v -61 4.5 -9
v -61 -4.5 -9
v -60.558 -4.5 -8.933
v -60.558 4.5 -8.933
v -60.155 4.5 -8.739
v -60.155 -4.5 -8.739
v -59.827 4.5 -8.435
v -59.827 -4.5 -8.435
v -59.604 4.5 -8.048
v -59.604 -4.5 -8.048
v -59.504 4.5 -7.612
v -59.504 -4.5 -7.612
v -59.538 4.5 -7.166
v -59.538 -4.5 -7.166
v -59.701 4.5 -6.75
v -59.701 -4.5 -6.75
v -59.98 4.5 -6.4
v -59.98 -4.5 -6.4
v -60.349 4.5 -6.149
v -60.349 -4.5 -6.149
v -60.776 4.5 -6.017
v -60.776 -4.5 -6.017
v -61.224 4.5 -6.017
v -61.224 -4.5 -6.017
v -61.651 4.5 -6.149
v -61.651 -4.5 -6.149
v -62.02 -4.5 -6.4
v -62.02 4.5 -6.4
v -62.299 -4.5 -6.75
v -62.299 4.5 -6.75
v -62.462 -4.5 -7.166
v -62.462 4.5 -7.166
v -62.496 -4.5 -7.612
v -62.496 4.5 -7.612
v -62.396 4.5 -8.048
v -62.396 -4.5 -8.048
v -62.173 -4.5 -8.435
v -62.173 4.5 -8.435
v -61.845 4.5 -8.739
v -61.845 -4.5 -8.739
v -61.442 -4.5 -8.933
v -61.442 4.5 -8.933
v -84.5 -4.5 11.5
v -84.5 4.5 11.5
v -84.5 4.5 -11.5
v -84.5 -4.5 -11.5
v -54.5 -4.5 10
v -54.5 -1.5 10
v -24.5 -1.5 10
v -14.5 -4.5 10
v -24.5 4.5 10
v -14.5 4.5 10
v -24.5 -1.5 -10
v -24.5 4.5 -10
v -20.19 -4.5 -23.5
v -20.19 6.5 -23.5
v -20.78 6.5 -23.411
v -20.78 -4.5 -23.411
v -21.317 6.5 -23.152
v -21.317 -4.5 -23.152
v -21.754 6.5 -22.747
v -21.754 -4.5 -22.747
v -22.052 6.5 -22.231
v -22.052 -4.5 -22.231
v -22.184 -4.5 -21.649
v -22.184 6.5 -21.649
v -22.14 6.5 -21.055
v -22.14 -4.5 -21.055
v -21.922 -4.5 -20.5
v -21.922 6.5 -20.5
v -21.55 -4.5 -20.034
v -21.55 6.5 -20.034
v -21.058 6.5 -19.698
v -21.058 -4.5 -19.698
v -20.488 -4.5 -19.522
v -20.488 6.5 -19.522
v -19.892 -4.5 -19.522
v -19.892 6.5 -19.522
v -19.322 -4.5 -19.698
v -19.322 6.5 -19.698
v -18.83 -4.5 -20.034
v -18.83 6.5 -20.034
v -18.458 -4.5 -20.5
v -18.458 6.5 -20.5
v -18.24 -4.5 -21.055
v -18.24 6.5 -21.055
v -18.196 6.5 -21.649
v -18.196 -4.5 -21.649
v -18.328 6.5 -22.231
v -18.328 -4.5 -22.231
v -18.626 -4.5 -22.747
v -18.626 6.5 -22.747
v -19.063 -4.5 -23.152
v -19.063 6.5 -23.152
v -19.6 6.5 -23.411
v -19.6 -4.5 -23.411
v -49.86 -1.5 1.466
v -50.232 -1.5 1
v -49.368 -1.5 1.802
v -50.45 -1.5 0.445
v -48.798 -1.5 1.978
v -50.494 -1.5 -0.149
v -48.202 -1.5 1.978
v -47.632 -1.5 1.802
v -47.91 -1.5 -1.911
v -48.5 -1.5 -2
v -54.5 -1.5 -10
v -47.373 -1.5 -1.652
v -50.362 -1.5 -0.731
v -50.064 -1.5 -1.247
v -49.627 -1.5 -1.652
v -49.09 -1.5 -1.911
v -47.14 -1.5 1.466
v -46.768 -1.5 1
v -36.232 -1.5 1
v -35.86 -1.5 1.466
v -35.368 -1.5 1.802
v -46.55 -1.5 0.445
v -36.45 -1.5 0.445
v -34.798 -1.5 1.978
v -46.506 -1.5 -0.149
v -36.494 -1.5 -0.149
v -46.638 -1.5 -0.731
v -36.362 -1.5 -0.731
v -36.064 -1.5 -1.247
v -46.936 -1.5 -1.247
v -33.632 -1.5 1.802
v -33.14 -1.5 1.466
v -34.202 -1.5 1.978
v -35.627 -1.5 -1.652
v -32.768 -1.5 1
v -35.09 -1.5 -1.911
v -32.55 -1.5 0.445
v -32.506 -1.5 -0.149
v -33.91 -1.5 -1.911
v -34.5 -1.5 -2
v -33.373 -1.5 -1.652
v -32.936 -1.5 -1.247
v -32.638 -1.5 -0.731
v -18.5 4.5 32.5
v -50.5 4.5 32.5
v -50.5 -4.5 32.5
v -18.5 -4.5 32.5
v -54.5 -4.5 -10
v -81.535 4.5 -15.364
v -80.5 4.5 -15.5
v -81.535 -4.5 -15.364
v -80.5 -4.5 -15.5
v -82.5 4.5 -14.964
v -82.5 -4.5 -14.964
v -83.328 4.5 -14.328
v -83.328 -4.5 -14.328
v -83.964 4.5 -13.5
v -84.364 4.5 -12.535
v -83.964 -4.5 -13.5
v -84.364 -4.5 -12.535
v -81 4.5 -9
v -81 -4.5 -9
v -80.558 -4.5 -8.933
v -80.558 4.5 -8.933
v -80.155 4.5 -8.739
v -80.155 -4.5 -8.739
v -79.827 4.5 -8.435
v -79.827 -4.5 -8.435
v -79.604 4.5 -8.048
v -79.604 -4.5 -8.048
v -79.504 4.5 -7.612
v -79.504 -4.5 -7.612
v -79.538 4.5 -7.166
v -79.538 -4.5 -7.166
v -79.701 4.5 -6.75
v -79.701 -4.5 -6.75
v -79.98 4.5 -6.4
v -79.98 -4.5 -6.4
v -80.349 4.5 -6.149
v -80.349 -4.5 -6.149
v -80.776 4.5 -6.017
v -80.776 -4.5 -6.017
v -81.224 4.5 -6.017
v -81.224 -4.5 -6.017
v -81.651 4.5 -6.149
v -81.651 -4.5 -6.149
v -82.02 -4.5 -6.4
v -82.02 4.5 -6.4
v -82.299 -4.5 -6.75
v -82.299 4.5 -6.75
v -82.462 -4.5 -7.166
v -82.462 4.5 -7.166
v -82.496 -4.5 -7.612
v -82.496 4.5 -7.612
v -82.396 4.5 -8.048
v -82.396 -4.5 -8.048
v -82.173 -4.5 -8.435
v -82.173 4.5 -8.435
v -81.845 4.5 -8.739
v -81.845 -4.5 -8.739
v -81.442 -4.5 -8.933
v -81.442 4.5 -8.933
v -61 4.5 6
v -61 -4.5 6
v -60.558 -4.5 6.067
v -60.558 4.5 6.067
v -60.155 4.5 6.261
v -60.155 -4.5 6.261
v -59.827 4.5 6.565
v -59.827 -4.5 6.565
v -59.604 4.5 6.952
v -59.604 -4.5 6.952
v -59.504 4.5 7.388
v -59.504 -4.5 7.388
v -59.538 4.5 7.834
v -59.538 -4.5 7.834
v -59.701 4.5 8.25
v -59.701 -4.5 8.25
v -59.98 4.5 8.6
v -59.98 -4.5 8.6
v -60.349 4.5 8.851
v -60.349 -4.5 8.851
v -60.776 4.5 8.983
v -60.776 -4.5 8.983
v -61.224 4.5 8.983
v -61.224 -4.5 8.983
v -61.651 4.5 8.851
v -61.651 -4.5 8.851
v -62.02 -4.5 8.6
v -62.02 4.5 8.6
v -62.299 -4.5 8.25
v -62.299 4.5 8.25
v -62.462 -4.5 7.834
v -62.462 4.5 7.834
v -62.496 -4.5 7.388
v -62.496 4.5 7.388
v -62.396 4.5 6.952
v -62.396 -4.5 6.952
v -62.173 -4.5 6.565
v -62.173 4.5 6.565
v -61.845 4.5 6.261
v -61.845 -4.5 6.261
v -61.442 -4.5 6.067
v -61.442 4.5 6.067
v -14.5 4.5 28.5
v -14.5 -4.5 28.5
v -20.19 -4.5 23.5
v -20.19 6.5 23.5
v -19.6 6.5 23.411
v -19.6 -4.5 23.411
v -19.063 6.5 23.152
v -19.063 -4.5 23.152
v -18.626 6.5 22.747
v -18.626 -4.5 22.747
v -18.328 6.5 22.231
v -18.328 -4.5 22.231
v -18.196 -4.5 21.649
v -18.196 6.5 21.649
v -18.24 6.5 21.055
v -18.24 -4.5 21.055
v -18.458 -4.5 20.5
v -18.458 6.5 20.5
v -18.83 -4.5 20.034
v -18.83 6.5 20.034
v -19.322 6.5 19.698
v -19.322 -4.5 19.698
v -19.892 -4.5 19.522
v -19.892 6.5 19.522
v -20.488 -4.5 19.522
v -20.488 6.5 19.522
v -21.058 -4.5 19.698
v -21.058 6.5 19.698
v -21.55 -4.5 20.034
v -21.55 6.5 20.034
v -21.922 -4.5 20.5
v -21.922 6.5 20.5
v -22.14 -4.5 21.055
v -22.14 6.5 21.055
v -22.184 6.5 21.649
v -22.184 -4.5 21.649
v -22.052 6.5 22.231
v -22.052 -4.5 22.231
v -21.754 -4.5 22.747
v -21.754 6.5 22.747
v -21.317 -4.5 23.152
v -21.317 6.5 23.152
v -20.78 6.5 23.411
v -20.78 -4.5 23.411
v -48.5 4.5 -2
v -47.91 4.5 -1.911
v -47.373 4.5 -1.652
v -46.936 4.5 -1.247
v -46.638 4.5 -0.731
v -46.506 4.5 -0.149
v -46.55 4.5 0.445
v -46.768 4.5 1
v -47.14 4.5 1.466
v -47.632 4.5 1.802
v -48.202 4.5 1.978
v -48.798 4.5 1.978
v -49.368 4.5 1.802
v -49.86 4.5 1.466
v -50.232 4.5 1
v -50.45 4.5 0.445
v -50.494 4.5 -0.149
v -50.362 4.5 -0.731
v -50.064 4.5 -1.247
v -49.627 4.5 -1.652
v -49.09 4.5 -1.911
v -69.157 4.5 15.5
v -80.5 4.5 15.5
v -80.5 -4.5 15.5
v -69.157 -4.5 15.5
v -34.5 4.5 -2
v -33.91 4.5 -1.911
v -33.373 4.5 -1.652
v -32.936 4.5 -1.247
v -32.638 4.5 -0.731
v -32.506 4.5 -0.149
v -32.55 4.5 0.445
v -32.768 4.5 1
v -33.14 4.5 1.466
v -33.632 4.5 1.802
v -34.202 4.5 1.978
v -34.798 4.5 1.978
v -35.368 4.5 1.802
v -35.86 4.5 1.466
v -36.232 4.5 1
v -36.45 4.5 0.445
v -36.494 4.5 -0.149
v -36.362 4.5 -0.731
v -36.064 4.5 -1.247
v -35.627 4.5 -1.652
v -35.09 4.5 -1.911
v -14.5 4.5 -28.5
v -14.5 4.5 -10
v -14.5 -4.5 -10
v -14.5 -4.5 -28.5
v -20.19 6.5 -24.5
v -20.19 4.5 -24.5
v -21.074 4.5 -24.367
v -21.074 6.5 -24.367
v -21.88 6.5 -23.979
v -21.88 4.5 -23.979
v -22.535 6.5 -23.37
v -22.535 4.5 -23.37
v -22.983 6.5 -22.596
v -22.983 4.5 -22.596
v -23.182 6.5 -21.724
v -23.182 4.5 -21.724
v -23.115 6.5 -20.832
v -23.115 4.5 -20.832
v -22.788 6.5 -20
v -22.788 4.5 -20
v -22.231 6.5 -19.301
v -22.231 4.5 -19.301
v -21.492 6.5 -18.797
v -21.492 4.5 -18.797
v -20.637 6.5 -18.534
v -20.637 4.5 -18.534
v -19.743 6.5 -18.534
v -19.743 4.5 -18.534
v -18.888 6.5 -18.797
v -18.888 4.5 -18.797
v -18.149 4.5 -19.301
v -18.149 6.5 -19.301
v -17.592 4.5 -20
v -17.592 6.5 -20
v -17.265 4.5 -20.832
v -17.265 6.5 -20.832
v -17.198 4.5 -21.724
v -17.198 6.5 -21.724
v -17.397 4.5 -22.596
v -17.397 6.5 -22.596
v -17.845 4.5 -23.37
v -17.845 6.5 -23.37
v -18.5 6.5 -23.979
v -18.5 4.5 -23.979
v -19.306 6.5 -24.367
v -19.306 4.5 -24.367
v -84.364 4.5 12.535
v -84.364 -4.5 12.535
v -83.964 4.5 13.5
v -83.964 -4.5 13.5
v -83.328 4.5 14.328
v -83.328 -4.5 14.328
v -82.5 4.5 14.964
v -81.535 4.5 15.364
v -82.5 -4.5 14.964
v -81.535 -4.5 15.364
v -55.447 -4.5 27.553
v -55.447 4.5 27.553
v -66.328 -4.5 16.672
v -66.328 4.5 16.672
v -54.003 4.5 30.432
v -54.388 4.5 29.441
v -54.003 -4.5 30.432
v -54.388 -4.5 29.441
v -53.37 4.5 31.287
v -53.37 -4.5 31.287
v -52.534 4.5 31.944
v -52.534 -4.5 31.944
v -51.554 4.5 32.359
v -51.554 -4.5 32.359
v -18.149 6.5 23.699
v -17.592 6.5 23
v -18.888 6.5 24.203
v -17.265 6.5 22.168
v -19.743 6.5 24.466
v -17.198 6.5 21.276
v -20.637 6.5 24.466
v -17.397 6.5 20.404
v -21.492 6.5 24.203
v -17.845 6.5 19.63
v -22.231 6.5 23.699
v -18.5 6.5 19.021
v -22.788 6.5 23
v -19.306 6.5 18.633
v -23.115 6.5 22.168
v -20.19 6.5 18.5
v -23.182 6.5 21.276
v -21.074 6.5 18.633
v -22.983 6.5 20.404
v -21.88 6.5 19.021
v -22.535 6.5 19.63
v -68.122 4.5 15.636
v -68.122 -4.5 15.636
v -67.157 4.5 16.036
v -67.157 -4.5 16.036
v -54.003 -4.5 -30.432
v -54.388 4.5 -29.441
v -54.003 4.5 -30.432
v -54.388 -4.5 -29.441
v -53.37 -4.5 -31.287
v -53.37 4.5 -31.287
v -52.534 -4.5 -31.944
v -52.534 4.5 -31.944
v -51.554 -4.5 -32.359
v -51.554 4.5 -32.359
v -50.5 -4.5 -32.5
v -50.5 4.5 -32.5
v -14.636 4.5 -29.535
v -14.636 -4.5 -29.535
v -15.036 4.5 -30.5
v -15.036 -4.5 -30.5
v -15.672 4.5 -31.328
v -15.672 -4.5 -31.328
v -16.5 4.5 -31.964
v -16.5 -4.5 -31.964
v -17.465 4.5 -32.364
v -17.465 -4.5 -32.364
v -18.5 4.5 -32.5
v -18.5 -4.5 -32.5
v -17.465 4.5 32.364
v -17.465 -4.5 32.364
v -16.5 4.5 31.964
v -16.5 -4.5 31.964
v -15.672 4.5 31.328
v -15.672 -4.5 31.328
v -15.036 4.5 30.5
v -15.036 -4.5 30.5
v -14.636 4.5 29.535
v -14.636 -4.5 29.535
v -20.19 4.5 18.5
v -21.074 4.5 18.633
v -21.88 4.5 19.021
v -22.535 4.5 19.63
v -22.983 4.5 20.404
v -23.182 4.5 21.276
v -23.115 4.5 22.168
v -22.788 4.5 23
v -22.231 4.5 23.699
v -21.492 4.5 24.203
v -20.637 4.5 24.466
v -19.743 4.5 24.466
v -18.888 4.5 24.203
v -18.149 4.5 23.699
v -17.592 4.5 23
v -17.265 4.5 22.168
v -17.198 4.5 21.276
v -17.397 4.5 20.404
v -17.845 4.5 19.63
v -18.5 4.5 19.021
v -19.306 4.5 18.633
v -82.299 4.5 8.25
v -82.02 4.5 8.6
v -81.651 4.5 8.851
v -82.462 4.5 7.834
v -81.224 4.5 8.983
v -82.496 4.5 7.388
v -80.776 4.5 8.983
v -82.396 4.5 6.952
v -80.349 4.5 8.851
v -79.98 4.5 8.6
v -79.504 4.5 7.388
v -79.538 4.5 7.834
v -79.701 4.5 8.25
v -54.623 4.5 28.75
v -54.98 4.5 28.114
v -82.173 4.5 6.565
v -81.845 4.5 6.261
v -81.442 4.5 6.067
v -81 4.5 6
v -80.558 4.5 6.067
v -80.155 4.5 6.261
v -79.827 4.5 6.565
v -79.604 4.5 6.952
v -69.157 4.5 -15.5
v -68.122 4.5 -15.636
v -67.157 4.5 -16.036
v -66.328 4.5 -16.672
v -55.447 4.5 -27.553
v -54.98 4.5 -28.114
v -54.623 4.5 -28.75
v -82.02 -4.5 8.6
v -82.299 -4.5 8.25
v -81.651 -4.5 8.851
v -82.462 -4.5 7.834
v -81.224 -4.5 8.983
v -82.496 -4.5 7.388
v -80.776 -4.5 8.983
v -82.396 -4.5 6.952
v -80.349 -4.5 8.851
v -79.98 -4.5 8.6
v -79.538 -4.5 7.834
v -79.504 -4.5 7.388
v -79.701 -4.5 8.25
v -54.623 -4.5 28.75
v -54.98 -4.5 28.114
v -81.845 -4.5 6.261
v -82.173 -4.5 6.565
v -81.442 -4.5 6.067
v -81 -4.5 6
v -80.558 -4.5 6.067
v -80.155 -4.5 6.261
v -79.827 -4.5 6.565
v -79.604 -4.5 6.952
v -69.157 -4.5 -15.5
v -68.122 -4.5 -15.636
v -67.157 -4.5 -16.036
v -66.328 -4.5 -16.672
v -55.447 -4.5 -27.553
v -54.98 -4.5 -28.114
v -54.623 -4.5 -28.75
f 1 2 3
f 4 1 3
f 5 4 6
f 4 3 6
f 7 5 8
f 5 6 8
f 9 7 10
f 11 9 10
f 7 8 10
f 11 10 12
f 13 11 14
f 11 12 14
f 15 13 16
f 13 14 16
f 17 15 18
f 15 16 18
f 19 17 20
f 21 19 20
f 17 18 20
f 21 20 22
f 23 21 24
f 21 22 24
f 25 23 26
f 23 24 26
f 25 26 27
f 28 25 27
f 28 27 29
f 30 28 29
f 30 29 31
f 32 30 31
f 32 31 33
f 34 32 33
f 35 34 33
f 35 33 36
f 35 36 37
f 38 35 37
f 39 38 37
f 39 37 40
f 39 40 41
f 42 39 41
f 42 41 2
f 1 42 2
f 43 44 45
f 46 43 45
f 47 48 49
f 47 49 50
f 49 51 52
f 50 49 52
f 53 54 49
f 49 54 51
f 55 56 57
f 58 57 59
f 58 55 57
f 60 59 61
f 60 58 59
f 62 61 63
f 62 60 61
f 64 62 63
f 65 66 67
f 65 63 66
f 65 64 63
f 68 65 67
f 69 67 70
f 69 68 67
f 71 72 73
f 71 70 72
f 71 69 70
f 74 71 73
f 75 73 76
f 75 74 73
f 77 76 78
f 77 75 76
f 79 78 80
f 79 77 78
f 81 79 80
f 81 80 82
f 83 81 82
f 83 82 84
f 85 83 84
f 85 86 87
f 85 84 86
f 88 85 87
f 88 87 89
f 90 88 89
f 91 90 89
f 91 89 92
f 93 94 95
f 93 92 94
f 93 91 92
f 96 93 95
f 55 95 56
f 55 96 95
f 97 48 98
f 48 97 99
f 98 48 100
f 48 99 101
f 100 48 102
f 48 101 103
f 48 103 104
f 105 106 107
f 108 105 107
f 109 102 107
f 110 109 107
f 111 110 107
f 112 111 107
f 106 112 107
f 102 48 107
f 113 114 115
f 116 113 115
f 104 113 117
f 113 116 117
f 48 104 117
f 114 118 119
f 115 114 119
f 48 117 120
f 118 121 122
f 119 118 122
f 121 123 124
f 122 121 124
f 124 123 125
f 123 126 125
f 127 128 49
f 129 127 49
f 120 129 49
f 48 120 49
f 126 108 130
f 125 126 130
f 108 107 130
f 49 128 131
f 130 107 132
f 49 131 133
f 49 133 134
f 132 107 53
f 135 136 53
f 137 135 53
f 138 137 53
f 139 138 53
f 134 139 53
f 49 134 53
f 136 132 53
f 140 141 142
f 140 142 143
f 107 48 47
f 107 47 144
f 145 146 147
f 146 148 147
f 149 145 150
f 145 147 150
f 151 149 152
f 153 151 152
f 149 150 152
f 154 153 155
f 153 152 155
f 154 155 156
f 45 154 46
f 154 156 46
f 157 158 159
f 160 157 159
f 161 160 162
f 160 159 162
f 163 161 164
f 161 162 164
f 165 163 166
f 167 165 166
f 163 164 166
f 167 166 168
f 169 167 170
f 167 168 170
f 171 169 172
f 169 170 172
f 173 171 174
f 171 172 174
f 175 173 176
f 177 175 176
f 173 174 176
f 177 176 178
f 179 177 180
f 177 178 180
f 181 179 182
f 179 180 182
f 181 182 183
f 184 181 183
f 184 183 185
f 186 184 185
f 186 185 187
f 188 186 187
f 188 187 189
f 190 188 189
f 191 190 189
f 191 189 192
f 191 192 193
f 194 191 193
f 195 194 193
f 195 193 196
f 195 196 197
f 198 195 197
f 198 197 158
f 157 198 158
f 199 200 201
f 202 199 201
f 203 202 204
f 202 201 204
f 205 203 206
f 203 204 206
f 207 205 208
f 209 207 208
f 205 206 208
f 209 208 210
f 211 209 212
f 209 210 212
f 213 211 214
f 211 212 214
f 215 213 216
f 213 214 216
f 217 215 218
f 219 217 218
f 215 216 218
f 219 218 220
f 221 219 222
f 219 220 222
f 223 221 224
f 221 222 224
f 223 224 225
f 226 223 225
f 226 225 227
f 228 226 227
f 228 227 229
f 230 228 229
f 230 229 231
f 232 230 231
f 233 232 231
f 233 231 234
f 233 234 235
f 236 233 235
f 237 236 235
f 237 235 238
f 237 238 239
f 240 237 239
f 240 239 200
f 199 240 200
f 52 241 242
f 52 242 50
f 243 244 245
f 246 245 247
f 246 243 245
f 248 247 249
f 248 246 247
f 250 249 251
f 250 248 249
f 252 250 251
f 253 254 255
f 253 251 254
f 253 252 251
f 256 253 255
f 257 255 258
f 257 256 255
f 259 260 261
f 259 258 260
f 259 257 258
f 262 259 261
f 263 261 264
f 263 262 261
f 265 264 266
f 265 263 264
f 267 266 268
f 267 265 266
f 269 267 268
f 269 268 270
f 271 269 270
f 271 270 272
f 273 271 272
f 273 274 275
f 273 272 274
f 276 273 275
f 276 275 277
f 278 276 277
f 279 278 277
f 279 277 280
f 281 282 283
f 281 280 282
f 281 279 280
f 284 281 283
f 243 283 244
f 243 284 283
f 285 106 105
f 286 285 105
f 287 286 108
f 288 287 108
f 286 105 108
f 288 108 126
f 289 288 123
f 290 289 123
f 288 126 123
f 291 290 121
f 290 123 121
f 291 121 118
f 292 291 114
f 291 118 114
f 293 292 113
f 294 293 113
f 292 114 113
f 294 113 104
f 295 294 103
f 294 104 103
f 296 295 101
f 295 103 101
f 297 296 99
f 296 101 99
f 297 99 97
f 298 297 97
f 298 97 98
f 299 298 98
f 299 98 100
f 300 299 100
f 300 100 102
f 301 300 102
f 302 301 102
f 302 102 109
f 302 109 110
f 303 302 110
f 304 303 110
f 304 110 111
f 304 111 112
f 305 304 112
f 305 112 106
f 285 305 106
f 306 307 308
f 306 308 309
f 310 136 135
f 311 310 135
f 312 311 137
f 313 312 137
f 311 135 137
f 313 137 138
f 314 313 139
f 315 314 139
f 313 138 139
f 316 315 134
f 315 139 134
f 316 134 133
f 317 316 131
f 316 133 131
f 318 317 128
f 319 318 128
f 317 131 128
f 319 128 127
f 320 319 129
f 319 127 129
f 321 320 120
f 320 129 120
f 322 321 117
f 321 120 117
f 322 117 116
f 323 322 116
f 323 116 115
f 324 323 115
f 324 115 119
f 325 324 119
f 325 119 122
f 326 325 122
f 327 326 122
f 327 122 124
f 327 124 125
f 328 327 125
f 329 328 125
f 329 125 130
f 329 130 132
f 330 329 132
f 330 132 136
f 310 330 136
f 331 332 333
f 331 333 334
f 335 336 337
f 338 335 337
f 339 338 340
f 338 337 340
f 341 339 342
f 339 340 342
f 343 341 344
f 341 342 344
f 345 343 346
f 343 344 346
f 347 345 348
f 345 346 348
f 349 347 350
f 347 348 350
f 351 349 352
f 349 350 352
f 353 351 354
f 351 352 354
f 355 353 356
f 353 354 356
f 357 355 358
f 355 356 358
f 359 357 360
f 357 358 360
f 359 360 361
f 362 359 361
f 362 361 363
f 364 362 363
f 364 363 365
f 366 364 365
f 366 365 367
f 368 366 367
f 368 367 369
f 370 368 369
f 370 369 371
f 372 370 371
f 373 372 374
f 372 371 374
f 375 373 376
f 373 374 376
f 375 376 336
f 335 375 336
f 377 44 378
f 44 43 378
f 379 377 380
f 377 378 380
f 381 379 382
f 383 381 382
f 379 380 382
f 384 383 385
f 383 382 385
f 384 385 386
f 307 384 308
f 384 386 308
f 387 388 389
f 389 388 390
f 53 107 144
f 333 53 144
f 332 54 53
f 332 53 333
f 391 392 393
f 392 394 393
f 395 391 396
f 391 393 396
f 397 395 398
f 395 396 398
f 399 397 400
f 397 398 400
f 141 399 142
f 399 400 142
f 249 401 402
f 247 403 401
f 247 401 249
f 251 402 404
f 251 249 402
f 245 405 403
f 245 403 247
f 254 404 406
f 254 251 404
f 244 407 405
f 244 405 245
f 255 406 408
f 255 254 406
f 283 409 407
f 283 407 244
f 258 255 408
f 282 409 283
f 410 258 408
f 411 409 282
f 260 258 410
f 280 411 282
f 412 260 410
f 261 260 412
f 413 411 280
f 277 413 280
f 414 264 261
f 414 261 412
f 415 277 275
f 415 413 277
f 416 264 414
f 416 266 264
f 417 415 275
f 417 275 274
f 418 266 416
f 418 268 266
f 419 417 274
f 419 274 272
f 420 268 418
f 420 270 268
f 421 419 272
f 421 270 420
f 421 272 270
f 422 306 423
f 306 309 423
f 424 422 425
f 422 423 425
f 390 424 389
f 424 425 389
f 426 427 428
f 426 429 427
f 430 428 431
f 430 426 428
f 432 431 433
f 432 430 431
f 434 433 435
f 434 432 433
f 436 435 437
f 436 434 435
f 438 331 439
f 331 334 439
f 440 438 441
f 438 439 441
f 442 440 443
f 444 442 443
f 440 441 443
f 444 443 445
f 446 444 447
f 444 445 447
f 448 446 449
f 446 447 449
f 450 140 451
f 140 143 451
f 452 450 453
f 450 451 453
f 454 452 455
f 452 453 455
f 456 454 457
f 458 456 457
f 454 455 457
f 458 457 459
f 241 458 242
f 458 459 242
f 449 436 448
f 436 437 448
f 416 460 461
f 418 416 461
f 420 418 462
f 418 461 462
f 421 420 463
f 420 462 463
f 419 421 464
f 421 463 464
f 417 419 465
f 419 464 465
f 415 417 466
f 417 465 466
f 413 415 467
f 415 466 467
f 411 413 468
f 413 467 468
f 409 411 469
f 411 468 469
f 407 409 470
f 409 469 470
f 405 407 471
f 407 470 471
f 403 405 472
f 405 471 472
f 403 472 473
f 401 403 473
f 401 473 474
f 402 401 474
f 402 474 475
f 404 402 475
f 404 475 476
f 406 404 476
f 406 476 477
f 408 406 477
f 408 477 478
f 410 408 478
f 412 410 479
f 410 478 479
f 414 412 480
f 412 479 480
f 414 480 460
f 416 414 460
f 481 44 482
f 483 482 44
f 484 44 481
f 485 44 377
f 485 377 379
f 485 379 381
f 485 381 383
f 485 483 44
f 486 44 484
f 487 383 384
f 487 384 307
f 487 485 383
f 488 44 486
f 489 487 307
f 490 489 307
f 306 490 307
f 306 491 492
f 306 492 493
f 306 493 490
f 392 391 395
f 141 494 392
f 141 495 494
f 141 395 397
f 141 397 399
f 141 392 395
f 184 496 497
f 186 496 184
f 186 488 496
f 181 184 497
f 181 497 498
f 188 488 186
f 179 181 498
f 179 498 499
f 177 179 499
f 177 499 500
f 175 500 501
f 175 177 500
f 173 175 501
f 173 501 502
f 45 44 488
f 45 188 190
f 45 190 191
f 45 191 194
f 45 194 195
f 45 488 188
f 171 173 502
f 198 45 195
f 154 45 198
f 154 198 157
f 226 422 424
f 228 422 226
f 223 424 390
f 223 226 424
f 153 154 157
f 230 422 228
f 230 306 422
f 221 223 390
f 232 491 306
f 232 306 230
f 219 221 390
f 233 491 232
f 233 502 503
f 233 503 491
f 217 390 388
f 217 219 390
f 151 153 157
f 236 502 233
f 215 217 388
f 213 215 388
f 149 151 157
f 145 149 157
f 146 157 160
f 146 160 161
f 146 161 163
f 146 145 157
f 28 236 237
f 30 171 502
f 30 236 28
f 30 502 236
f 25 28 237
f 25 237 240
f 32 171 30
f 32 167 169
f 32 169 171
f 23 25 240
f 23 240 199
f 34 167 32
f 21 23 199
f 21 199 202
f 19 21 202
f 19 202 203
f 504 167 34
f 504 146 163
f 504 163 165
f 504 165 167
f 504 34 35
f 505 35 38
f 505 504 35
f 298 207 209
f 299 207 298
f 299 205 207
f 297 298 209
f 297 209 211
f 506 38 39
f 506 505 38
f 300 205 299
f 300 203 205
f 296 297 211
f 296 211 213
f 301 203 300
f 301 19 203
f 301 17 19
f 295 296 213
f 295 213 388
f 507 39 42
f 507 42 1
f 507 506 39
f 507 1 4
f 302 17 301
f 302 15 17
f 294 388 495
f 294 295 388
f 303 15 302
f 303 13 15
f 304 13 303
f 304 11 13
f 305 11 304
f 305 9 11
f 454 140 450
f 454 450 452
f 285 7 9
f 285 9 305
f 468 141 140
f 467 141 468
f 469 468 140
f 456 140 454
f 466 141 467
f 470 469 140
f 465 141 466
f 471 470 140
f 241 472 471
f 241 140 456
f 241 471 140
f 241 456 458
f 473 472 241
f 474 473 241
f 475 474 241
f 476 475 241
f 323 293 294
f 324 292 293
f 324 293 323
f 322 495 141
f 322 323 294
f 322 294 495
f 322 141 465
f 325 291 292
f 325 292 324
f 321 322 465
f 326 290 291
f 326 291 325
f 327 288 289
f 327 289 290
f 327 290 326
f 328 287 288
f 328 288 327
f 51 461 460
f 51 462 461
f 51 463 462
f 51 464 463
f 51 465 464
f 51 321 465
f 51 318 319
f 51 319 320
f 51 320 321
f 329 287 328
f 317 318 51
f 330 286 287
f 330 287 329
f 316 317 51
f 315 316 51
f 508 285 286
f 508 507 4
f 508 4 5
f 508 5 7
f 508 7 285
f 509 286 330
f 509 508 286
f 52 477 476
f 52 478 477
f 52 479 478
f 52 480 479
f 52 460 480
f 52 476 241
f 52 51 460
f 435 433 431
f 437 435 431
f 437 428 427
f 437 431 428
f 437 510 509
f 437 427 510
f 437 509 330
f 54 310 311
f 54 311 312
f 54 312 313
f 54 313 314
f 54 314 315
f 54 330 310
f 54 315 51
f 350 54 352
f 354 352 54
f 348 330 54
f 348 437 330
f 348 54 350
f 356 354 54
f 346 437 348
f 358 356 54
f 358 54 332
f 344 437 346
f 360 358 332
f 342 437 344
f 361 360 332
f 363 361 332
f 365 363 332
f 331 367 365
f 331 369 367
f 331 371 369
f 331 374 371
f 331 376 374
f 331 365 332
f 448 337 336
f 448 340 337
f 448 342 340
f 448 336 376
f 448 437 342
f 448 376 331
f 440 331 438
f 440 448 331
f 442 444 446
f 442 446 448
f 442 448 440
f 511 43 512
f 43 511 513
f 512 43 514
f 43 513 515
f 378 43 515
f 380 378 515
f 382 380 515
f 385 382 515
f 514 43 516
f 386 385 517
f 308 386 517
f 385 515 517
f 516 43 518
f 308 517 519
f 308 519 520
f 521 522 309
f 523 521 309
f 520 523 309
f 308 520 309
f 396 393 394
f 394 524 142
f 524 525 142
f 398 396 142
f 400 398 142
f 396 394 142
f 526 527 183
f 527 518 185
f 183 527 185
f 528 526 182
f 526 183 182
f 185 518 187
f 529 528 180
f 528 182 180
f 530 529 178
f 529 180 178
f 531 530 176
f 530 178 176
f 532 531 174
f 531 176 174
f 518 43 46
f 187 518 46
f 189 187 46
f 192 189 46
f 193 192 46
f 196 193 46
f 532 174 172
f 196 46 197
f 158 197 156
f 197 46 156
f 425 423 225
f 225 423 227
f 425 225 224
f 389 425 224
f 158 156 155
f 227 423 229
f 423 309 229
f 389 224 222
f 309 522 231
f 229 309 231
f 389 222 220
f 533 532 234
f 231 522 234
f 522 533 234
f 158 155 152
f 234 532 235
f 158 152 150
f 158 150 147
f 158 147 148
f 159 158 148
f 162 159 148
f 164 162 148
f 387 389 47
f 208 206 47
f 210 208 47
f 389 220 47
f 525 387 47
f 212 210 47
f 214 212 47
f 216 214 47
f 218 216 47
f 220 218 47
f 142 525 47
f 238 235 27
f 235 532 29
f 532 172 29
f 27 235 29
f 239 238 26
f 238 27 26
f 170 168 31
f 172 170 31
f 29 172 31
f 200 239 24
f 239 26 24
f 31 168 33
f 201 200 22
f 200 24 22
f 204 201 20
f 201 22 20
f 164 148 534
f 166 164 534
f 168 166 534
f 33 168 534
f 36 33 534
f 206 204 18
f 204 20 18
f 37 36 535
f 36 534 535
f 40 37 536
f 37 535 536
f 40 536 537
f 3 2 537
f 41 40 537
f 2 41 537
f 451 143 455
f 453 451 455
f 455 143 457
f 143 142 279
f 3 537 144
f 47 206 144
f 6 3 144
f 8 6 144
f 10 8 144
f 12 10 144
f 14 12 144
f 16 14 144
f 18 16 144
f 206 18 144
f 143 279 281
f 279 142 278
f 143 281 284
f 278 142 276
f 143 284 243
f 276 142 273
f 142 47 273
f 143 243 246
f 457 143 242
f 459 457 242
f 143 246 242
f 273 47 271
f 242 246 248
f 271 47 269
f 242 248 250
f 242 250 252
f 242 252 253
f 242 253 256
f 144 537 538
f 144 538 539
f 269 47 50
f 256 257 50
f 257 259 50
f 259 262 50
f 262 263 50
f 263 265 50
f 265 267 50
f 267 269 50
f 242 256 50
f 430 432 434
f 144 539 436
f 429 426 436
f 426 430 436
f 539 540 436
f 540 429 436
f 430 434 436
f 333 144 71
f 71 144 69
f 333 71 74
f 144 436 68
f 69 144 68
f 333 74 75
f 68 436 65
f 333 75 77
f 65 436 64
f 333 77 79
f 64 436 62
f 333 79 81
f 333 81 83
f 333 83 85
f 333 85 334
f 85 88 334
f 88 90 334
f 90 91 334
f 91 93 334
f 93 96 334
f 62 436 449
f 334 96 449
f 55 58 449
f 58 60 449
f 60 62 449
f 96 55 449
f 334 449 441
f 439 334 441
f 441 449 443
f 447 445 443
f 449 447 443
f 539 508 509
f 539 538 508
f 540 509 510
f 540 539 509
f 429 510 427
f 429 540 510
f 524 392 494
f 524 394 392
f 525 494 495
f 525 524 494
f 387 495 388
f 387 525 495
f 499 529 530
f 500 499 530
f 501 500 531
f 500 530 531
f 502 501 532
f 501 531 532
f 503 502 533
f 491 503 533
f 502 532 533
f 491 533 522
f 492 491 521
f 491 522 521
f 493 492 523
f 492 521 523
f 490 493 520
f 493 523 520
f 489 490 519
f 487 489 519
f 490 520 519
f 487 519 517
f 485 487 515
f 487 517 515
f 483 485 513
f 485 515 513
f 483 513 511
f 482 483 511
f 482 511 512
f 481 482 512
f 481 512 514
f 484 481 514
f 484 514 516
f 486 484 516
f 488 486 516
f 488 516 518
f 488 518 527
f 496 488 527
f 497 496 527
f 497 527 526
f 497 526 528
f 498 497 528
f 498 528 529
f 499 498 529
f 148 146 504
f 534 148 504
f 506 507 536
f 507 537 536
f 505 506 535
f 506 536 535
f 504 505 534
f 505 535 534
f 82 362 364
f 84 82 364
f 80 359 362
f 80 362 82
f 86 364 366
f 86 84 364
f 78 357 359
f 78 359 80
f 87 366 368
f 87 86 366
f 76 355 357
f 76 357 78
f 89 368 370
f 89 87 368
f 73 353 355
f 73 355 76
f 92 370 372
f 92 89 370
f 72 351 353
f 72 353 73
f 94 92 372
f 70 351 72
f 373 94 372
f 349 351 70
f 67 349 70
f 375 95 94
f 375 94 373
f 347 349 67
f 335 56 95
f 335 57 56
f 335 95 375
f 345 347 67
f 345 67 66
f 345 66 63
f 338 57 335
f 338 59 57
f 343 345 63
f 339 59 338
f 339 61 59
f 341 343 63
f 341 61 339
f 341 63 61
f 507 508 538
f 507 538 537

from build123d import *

# Parameters (mm, degrees)
SKETCH1_R               = 12
BOSS_EXTRUDE1_DEPTH     = 4.5
SKETCH2_R               = 1.7
CUT_EXTRUDE1_DEPTH      = 91.980767198
FILLET1_R               = 4
CUT_EXTRUDE4_DEPTH      = 91.980767198
SKETCH6_R               = 1.5
CUT_EXTRUDE5_DEPTH      = 41
CUT_EXTRUDE6_START      = -6
SKETCH7_W               = 30
SKETCH7_H               = 20
CUT_EXTRUDE6_DEPTH      = 3
SKETCH8_W               = 30
SKETCH8_H               = 17
CUT_EXTRUDE7_DEPTH      = 9
FILLET5_R               = 4
SKETCH10_W              = 10
SKETCH10_H              = 22.5
BOSS_EXTRUDE2_DEPTH     = 9
SKETCH13_R              = 3
BOSS_EXTRUDE4_DEPTH     = 2
CUT_EXTRUDE8_DEPTH      = 5
CUT_EXTRUDE8_DEPTH_BACK = 9
SKETCH11_R              = 2
FILLET6_R               = 4
BOSS_EXTRUDE3_DEPTH     = 9
FILLET8_R               = 4
SKETCH14_R              = 2
CUT_EXTRUDE9_DEPTH      = 16


with BuildPart() as part:
    # Sketch1 → Boss-Extrude1 (new, symmetric)
    with BuildSketch(Plane(origin=(0, 0, 0), x_dir=(1, 0, 0), z_dir=(0, 1, 0))):
        Polygon((21.5, 20), (21.5, -20), (-20.5, -32.5), (-84.5, -32.5), (-84.5, 32.5), (-20.5, 32.5), align=None)
        with Locations(Location((0, 0, 0), (0, 0, 270))):
            Circle(SKETCH1_R, mode=Mode.SUBTRACT)
    extrude(amount=BOSS_EXTRUDE1_DEPTH, both=True)

    # Sketch2 → Cut-Extrude1 (cut, through all)
    with BuildSketch(Plane(origin=(0, 4.5, 0), x_dir=(1, 0, 0), z_dir=(0, 1, 0))):
        with Locations(Location((15.5, 15.5, 0), (0, 0, 270))):
            Circle(SKETCH2_R)
        with Locations(Location((-15.5, 15.5, 0), (0, 0, 270))):
            Circle(SKETCH2_R)
        with Locations(Location((-15.5, -15.5, 0), (0, 0, 270))):
            Circle(SKETCH2_R)
        with Locations(Location((15.5, -15.5, 0), (0, 0, 270))):
            Circle(SKETCH2_R)
        with Locations(Location((-19.5, 27.5, 0), (0, 0, 270))):
            Circle(SKETCH2_R)
        with Locations(Location((-19.5, -27.5, 0), (0, 0, 270))):
            Circle(SKETCH2_R)
    extrude(amount=-CUT_EXTRUDE1_DEPTH, mode=Mode.SUBTRACT)

    # Fillet1
    fillet1_edges = [part.edges().sort_by_distance(p)[0] for p in [
        (-20.5, 0, 32.5),
        (-84.5, 0, 32.5),
        (-84.5, 0, -32.5),
        (-20.5, 0, -32.5),
        (21.5, 0, -20),
        (21.5, 0, 20),
    ]]
    fillet(fillet1_edges, radius=FILLET1_R)

    # Sketch5 → Cut-Extrude4 (cut, through all)
    with BuildSketch(Plane(origin=(0, 4.5, 0), x_dir=(1, 0, 0), z_dir=(0, 1, 0))):
        Polygon((-24.5, 32.5), (-24.5, 10), (-24.5, -10), (-24.5, -32.5), (26.912022907, -32.5), (26.912022907, 32.5), align=None)
    extrude(amount=-CUT_EXTRUDE4_DEPTH, mode=Mode.SUBTRACT)

    # Sketch6 → Cut-Extrude5 (cut)
    with BuildSketch(Plane.XZ.offset(4.5)):
        with Locations(Location((-81, -7.5, 0), (0, 0, 270))):
            Circle(SKETCH6_R)
        with Locations(Location((-81, 7.5, 0), (0, 0, 270))):
            Circle(SKETCH6_R)
        with Locations(Location((-61, -7.5, 0), (0, 0, 270))):
            Circle(SKETCH6_R)
        with Locations(Location((-61, 7.5, 0), (0, 0, 270))):
            Circle(SKETCH6_R)
    extrude(amount=-CUT_EXTRUDE5_DEPTH, mode=Mode.SUBTRACT)

    # Sketch7 → Cut-Extrude6 (cut)
    with BuildSketch(Plane(origin=(0, 4.5, 0), x_dir=(1, 0, 0), z_dir=(0, 1, 0)).offset(CUT_EXTRUDE6_START)):
        with Locations((-39.5, 0)):
            Rectangle(SKETCH7_W, SKETCH7_H)
    extrude(amount=-CUT_EXTRUDE6_DEPTH, mode=Mode.SUBTRACT)

    # Sketch8 → Cut-Extrude7 (cut)
    with BuildSketch(Plane(origin=(0, 4.5, 0), x_dir=(1, 0, 0), z_dir=(0, 1, 0))):
        with Locations((-69.5, 24)):
            Rectangle(SKETCH8_W, SKETCH8_H)
        with Locations((-69.5, -24)):
            Rectangle(SKETCH8_W, SKETCH8_H)
    extrude(amount=-CUT_EXTRUDE7_DEPTH, mode=Mode.SUBTRACT)

    # Fillet5
    fillet5_edges = [part.edges().sort_by_distance(p)[0] for p in [
        (-84.5, 0, -15.5),
        (-54.5, 0, -32.5),
        (-84.5, 0, 15.5),
        (-54.5, 0, 32.5),
    ]]
    fillet(fillet5_edges, radius=FILLET5_R)

    # Sketch10 → Boss-Extrude2 (add)
    with BuildSketch(Plane(origin=(0, 4.5, 0), x_dir=(1, 0, 0), z_dir=(0, 1, 0))):
        with Locations((-19.5, -21.25)):
            Rectangle(SKETCH10_W, SKETCH10_H)
        with Locations((-19.5, 21.25)):
            Rectangle(SKETCH10_W, SKETCH10_H)
    extrude(amount=-BOSS_EXTRUDE2_DEPTH)

    # Sketch13 → Boss-Extrude4 (add)
    with BuildSketch(Plane(origin=(0, 4.5, 0), x_dir=(1, 0, 0), z_dir=(0, 1, 0))):
        with Locations(Location((-20.19, -21.5, 0), (0, 0, 90))):
            Circle(SKETCH13_R)
        with Locations(Location((-20.19, 21.5, 0), (0, 0, 90))):
            Circle(SKETCH13_R)
    extrude(amount=BOSS_EXTRUDE4_DEPTH)

    # Sketch11 → Cut-Extrude8 (cut, two sides: drawn at the far end of the back side and taken through both)
    with BuildSketch(Plane(origin=(0, 4.5, 0), x_dir=(1, 0, 0), z_dir=(0, 1, 0)).offset(-CUT_EXTRUDE8_DEPTH_BACK)):
        with Locations(Location((-20.19, -21.5, 0), (0, 0, 270))):
            Circle(SKETCH11_R)
        with Locations(Location((-20.19, 21.5, 0), (0, 0, 90))):
            Circle(SKETCH11_R)
    extrude(amount=CUT_EXTRUDE8_DEPTH + CUT_EXTRUDE8_DEPTH_BACK, mode=Mode.SUBTRACT)

    # Fillet6
    fillet6_edges = [part.edges().sort_by_distance(p)[0] for p in [
        (-14.5, 0, 32.5),
        (-14.5, 0, -32.5),
    ]]
    fillet(fillet6_edges, radius=FILLET6_R)

    # Sketch12 → Boss-Extrude3 (add)
    with BuildSketch(Plane(origin=(0, 4.5, 0), x_dir=(1, 0, 0), z_dir=(0, 1, 0))):
        Polygon((-54.5, 28.5), (-67.5, 15.5), (-54.5, 15.5), align=None)
        Polygon((-54.5, -28.5), (-67.5, -15.5), (-54.5, -15.5), align=None)
    extrude(amount=-BOSS_EXTRUDE3_DEPTH)

    # Fillet8
    fillet8_edges = [part.edges().sort_by_distance(p)[0] for p in [
        (-54.5, 0, -28.5),
        (-54.5, 0, 28.5),
        (-67.5, 0, -15.5),
        (-67.5, 0, 15.5),
    ]]
    fillet(fillet8_edges, radius=FILLET8_R)

    # Sketch14 → Cut-Extrude9 (cut)
    with BuildSketch(Plane.XZ.offset(1.5)):
        with Locations(Location((-48.5, 0, 0), (0, 0, 270))):
            Circle(SKETCH14_R)
        with Locations(Location((-34.5, 0, 0), (0, 0, 270))):
            Circle(SKETCH14_R)
    extrude(amount=-CUT_EXTRUDE9_DEPTH, mode=Mode.SUBTRACT)


solid = part.part
